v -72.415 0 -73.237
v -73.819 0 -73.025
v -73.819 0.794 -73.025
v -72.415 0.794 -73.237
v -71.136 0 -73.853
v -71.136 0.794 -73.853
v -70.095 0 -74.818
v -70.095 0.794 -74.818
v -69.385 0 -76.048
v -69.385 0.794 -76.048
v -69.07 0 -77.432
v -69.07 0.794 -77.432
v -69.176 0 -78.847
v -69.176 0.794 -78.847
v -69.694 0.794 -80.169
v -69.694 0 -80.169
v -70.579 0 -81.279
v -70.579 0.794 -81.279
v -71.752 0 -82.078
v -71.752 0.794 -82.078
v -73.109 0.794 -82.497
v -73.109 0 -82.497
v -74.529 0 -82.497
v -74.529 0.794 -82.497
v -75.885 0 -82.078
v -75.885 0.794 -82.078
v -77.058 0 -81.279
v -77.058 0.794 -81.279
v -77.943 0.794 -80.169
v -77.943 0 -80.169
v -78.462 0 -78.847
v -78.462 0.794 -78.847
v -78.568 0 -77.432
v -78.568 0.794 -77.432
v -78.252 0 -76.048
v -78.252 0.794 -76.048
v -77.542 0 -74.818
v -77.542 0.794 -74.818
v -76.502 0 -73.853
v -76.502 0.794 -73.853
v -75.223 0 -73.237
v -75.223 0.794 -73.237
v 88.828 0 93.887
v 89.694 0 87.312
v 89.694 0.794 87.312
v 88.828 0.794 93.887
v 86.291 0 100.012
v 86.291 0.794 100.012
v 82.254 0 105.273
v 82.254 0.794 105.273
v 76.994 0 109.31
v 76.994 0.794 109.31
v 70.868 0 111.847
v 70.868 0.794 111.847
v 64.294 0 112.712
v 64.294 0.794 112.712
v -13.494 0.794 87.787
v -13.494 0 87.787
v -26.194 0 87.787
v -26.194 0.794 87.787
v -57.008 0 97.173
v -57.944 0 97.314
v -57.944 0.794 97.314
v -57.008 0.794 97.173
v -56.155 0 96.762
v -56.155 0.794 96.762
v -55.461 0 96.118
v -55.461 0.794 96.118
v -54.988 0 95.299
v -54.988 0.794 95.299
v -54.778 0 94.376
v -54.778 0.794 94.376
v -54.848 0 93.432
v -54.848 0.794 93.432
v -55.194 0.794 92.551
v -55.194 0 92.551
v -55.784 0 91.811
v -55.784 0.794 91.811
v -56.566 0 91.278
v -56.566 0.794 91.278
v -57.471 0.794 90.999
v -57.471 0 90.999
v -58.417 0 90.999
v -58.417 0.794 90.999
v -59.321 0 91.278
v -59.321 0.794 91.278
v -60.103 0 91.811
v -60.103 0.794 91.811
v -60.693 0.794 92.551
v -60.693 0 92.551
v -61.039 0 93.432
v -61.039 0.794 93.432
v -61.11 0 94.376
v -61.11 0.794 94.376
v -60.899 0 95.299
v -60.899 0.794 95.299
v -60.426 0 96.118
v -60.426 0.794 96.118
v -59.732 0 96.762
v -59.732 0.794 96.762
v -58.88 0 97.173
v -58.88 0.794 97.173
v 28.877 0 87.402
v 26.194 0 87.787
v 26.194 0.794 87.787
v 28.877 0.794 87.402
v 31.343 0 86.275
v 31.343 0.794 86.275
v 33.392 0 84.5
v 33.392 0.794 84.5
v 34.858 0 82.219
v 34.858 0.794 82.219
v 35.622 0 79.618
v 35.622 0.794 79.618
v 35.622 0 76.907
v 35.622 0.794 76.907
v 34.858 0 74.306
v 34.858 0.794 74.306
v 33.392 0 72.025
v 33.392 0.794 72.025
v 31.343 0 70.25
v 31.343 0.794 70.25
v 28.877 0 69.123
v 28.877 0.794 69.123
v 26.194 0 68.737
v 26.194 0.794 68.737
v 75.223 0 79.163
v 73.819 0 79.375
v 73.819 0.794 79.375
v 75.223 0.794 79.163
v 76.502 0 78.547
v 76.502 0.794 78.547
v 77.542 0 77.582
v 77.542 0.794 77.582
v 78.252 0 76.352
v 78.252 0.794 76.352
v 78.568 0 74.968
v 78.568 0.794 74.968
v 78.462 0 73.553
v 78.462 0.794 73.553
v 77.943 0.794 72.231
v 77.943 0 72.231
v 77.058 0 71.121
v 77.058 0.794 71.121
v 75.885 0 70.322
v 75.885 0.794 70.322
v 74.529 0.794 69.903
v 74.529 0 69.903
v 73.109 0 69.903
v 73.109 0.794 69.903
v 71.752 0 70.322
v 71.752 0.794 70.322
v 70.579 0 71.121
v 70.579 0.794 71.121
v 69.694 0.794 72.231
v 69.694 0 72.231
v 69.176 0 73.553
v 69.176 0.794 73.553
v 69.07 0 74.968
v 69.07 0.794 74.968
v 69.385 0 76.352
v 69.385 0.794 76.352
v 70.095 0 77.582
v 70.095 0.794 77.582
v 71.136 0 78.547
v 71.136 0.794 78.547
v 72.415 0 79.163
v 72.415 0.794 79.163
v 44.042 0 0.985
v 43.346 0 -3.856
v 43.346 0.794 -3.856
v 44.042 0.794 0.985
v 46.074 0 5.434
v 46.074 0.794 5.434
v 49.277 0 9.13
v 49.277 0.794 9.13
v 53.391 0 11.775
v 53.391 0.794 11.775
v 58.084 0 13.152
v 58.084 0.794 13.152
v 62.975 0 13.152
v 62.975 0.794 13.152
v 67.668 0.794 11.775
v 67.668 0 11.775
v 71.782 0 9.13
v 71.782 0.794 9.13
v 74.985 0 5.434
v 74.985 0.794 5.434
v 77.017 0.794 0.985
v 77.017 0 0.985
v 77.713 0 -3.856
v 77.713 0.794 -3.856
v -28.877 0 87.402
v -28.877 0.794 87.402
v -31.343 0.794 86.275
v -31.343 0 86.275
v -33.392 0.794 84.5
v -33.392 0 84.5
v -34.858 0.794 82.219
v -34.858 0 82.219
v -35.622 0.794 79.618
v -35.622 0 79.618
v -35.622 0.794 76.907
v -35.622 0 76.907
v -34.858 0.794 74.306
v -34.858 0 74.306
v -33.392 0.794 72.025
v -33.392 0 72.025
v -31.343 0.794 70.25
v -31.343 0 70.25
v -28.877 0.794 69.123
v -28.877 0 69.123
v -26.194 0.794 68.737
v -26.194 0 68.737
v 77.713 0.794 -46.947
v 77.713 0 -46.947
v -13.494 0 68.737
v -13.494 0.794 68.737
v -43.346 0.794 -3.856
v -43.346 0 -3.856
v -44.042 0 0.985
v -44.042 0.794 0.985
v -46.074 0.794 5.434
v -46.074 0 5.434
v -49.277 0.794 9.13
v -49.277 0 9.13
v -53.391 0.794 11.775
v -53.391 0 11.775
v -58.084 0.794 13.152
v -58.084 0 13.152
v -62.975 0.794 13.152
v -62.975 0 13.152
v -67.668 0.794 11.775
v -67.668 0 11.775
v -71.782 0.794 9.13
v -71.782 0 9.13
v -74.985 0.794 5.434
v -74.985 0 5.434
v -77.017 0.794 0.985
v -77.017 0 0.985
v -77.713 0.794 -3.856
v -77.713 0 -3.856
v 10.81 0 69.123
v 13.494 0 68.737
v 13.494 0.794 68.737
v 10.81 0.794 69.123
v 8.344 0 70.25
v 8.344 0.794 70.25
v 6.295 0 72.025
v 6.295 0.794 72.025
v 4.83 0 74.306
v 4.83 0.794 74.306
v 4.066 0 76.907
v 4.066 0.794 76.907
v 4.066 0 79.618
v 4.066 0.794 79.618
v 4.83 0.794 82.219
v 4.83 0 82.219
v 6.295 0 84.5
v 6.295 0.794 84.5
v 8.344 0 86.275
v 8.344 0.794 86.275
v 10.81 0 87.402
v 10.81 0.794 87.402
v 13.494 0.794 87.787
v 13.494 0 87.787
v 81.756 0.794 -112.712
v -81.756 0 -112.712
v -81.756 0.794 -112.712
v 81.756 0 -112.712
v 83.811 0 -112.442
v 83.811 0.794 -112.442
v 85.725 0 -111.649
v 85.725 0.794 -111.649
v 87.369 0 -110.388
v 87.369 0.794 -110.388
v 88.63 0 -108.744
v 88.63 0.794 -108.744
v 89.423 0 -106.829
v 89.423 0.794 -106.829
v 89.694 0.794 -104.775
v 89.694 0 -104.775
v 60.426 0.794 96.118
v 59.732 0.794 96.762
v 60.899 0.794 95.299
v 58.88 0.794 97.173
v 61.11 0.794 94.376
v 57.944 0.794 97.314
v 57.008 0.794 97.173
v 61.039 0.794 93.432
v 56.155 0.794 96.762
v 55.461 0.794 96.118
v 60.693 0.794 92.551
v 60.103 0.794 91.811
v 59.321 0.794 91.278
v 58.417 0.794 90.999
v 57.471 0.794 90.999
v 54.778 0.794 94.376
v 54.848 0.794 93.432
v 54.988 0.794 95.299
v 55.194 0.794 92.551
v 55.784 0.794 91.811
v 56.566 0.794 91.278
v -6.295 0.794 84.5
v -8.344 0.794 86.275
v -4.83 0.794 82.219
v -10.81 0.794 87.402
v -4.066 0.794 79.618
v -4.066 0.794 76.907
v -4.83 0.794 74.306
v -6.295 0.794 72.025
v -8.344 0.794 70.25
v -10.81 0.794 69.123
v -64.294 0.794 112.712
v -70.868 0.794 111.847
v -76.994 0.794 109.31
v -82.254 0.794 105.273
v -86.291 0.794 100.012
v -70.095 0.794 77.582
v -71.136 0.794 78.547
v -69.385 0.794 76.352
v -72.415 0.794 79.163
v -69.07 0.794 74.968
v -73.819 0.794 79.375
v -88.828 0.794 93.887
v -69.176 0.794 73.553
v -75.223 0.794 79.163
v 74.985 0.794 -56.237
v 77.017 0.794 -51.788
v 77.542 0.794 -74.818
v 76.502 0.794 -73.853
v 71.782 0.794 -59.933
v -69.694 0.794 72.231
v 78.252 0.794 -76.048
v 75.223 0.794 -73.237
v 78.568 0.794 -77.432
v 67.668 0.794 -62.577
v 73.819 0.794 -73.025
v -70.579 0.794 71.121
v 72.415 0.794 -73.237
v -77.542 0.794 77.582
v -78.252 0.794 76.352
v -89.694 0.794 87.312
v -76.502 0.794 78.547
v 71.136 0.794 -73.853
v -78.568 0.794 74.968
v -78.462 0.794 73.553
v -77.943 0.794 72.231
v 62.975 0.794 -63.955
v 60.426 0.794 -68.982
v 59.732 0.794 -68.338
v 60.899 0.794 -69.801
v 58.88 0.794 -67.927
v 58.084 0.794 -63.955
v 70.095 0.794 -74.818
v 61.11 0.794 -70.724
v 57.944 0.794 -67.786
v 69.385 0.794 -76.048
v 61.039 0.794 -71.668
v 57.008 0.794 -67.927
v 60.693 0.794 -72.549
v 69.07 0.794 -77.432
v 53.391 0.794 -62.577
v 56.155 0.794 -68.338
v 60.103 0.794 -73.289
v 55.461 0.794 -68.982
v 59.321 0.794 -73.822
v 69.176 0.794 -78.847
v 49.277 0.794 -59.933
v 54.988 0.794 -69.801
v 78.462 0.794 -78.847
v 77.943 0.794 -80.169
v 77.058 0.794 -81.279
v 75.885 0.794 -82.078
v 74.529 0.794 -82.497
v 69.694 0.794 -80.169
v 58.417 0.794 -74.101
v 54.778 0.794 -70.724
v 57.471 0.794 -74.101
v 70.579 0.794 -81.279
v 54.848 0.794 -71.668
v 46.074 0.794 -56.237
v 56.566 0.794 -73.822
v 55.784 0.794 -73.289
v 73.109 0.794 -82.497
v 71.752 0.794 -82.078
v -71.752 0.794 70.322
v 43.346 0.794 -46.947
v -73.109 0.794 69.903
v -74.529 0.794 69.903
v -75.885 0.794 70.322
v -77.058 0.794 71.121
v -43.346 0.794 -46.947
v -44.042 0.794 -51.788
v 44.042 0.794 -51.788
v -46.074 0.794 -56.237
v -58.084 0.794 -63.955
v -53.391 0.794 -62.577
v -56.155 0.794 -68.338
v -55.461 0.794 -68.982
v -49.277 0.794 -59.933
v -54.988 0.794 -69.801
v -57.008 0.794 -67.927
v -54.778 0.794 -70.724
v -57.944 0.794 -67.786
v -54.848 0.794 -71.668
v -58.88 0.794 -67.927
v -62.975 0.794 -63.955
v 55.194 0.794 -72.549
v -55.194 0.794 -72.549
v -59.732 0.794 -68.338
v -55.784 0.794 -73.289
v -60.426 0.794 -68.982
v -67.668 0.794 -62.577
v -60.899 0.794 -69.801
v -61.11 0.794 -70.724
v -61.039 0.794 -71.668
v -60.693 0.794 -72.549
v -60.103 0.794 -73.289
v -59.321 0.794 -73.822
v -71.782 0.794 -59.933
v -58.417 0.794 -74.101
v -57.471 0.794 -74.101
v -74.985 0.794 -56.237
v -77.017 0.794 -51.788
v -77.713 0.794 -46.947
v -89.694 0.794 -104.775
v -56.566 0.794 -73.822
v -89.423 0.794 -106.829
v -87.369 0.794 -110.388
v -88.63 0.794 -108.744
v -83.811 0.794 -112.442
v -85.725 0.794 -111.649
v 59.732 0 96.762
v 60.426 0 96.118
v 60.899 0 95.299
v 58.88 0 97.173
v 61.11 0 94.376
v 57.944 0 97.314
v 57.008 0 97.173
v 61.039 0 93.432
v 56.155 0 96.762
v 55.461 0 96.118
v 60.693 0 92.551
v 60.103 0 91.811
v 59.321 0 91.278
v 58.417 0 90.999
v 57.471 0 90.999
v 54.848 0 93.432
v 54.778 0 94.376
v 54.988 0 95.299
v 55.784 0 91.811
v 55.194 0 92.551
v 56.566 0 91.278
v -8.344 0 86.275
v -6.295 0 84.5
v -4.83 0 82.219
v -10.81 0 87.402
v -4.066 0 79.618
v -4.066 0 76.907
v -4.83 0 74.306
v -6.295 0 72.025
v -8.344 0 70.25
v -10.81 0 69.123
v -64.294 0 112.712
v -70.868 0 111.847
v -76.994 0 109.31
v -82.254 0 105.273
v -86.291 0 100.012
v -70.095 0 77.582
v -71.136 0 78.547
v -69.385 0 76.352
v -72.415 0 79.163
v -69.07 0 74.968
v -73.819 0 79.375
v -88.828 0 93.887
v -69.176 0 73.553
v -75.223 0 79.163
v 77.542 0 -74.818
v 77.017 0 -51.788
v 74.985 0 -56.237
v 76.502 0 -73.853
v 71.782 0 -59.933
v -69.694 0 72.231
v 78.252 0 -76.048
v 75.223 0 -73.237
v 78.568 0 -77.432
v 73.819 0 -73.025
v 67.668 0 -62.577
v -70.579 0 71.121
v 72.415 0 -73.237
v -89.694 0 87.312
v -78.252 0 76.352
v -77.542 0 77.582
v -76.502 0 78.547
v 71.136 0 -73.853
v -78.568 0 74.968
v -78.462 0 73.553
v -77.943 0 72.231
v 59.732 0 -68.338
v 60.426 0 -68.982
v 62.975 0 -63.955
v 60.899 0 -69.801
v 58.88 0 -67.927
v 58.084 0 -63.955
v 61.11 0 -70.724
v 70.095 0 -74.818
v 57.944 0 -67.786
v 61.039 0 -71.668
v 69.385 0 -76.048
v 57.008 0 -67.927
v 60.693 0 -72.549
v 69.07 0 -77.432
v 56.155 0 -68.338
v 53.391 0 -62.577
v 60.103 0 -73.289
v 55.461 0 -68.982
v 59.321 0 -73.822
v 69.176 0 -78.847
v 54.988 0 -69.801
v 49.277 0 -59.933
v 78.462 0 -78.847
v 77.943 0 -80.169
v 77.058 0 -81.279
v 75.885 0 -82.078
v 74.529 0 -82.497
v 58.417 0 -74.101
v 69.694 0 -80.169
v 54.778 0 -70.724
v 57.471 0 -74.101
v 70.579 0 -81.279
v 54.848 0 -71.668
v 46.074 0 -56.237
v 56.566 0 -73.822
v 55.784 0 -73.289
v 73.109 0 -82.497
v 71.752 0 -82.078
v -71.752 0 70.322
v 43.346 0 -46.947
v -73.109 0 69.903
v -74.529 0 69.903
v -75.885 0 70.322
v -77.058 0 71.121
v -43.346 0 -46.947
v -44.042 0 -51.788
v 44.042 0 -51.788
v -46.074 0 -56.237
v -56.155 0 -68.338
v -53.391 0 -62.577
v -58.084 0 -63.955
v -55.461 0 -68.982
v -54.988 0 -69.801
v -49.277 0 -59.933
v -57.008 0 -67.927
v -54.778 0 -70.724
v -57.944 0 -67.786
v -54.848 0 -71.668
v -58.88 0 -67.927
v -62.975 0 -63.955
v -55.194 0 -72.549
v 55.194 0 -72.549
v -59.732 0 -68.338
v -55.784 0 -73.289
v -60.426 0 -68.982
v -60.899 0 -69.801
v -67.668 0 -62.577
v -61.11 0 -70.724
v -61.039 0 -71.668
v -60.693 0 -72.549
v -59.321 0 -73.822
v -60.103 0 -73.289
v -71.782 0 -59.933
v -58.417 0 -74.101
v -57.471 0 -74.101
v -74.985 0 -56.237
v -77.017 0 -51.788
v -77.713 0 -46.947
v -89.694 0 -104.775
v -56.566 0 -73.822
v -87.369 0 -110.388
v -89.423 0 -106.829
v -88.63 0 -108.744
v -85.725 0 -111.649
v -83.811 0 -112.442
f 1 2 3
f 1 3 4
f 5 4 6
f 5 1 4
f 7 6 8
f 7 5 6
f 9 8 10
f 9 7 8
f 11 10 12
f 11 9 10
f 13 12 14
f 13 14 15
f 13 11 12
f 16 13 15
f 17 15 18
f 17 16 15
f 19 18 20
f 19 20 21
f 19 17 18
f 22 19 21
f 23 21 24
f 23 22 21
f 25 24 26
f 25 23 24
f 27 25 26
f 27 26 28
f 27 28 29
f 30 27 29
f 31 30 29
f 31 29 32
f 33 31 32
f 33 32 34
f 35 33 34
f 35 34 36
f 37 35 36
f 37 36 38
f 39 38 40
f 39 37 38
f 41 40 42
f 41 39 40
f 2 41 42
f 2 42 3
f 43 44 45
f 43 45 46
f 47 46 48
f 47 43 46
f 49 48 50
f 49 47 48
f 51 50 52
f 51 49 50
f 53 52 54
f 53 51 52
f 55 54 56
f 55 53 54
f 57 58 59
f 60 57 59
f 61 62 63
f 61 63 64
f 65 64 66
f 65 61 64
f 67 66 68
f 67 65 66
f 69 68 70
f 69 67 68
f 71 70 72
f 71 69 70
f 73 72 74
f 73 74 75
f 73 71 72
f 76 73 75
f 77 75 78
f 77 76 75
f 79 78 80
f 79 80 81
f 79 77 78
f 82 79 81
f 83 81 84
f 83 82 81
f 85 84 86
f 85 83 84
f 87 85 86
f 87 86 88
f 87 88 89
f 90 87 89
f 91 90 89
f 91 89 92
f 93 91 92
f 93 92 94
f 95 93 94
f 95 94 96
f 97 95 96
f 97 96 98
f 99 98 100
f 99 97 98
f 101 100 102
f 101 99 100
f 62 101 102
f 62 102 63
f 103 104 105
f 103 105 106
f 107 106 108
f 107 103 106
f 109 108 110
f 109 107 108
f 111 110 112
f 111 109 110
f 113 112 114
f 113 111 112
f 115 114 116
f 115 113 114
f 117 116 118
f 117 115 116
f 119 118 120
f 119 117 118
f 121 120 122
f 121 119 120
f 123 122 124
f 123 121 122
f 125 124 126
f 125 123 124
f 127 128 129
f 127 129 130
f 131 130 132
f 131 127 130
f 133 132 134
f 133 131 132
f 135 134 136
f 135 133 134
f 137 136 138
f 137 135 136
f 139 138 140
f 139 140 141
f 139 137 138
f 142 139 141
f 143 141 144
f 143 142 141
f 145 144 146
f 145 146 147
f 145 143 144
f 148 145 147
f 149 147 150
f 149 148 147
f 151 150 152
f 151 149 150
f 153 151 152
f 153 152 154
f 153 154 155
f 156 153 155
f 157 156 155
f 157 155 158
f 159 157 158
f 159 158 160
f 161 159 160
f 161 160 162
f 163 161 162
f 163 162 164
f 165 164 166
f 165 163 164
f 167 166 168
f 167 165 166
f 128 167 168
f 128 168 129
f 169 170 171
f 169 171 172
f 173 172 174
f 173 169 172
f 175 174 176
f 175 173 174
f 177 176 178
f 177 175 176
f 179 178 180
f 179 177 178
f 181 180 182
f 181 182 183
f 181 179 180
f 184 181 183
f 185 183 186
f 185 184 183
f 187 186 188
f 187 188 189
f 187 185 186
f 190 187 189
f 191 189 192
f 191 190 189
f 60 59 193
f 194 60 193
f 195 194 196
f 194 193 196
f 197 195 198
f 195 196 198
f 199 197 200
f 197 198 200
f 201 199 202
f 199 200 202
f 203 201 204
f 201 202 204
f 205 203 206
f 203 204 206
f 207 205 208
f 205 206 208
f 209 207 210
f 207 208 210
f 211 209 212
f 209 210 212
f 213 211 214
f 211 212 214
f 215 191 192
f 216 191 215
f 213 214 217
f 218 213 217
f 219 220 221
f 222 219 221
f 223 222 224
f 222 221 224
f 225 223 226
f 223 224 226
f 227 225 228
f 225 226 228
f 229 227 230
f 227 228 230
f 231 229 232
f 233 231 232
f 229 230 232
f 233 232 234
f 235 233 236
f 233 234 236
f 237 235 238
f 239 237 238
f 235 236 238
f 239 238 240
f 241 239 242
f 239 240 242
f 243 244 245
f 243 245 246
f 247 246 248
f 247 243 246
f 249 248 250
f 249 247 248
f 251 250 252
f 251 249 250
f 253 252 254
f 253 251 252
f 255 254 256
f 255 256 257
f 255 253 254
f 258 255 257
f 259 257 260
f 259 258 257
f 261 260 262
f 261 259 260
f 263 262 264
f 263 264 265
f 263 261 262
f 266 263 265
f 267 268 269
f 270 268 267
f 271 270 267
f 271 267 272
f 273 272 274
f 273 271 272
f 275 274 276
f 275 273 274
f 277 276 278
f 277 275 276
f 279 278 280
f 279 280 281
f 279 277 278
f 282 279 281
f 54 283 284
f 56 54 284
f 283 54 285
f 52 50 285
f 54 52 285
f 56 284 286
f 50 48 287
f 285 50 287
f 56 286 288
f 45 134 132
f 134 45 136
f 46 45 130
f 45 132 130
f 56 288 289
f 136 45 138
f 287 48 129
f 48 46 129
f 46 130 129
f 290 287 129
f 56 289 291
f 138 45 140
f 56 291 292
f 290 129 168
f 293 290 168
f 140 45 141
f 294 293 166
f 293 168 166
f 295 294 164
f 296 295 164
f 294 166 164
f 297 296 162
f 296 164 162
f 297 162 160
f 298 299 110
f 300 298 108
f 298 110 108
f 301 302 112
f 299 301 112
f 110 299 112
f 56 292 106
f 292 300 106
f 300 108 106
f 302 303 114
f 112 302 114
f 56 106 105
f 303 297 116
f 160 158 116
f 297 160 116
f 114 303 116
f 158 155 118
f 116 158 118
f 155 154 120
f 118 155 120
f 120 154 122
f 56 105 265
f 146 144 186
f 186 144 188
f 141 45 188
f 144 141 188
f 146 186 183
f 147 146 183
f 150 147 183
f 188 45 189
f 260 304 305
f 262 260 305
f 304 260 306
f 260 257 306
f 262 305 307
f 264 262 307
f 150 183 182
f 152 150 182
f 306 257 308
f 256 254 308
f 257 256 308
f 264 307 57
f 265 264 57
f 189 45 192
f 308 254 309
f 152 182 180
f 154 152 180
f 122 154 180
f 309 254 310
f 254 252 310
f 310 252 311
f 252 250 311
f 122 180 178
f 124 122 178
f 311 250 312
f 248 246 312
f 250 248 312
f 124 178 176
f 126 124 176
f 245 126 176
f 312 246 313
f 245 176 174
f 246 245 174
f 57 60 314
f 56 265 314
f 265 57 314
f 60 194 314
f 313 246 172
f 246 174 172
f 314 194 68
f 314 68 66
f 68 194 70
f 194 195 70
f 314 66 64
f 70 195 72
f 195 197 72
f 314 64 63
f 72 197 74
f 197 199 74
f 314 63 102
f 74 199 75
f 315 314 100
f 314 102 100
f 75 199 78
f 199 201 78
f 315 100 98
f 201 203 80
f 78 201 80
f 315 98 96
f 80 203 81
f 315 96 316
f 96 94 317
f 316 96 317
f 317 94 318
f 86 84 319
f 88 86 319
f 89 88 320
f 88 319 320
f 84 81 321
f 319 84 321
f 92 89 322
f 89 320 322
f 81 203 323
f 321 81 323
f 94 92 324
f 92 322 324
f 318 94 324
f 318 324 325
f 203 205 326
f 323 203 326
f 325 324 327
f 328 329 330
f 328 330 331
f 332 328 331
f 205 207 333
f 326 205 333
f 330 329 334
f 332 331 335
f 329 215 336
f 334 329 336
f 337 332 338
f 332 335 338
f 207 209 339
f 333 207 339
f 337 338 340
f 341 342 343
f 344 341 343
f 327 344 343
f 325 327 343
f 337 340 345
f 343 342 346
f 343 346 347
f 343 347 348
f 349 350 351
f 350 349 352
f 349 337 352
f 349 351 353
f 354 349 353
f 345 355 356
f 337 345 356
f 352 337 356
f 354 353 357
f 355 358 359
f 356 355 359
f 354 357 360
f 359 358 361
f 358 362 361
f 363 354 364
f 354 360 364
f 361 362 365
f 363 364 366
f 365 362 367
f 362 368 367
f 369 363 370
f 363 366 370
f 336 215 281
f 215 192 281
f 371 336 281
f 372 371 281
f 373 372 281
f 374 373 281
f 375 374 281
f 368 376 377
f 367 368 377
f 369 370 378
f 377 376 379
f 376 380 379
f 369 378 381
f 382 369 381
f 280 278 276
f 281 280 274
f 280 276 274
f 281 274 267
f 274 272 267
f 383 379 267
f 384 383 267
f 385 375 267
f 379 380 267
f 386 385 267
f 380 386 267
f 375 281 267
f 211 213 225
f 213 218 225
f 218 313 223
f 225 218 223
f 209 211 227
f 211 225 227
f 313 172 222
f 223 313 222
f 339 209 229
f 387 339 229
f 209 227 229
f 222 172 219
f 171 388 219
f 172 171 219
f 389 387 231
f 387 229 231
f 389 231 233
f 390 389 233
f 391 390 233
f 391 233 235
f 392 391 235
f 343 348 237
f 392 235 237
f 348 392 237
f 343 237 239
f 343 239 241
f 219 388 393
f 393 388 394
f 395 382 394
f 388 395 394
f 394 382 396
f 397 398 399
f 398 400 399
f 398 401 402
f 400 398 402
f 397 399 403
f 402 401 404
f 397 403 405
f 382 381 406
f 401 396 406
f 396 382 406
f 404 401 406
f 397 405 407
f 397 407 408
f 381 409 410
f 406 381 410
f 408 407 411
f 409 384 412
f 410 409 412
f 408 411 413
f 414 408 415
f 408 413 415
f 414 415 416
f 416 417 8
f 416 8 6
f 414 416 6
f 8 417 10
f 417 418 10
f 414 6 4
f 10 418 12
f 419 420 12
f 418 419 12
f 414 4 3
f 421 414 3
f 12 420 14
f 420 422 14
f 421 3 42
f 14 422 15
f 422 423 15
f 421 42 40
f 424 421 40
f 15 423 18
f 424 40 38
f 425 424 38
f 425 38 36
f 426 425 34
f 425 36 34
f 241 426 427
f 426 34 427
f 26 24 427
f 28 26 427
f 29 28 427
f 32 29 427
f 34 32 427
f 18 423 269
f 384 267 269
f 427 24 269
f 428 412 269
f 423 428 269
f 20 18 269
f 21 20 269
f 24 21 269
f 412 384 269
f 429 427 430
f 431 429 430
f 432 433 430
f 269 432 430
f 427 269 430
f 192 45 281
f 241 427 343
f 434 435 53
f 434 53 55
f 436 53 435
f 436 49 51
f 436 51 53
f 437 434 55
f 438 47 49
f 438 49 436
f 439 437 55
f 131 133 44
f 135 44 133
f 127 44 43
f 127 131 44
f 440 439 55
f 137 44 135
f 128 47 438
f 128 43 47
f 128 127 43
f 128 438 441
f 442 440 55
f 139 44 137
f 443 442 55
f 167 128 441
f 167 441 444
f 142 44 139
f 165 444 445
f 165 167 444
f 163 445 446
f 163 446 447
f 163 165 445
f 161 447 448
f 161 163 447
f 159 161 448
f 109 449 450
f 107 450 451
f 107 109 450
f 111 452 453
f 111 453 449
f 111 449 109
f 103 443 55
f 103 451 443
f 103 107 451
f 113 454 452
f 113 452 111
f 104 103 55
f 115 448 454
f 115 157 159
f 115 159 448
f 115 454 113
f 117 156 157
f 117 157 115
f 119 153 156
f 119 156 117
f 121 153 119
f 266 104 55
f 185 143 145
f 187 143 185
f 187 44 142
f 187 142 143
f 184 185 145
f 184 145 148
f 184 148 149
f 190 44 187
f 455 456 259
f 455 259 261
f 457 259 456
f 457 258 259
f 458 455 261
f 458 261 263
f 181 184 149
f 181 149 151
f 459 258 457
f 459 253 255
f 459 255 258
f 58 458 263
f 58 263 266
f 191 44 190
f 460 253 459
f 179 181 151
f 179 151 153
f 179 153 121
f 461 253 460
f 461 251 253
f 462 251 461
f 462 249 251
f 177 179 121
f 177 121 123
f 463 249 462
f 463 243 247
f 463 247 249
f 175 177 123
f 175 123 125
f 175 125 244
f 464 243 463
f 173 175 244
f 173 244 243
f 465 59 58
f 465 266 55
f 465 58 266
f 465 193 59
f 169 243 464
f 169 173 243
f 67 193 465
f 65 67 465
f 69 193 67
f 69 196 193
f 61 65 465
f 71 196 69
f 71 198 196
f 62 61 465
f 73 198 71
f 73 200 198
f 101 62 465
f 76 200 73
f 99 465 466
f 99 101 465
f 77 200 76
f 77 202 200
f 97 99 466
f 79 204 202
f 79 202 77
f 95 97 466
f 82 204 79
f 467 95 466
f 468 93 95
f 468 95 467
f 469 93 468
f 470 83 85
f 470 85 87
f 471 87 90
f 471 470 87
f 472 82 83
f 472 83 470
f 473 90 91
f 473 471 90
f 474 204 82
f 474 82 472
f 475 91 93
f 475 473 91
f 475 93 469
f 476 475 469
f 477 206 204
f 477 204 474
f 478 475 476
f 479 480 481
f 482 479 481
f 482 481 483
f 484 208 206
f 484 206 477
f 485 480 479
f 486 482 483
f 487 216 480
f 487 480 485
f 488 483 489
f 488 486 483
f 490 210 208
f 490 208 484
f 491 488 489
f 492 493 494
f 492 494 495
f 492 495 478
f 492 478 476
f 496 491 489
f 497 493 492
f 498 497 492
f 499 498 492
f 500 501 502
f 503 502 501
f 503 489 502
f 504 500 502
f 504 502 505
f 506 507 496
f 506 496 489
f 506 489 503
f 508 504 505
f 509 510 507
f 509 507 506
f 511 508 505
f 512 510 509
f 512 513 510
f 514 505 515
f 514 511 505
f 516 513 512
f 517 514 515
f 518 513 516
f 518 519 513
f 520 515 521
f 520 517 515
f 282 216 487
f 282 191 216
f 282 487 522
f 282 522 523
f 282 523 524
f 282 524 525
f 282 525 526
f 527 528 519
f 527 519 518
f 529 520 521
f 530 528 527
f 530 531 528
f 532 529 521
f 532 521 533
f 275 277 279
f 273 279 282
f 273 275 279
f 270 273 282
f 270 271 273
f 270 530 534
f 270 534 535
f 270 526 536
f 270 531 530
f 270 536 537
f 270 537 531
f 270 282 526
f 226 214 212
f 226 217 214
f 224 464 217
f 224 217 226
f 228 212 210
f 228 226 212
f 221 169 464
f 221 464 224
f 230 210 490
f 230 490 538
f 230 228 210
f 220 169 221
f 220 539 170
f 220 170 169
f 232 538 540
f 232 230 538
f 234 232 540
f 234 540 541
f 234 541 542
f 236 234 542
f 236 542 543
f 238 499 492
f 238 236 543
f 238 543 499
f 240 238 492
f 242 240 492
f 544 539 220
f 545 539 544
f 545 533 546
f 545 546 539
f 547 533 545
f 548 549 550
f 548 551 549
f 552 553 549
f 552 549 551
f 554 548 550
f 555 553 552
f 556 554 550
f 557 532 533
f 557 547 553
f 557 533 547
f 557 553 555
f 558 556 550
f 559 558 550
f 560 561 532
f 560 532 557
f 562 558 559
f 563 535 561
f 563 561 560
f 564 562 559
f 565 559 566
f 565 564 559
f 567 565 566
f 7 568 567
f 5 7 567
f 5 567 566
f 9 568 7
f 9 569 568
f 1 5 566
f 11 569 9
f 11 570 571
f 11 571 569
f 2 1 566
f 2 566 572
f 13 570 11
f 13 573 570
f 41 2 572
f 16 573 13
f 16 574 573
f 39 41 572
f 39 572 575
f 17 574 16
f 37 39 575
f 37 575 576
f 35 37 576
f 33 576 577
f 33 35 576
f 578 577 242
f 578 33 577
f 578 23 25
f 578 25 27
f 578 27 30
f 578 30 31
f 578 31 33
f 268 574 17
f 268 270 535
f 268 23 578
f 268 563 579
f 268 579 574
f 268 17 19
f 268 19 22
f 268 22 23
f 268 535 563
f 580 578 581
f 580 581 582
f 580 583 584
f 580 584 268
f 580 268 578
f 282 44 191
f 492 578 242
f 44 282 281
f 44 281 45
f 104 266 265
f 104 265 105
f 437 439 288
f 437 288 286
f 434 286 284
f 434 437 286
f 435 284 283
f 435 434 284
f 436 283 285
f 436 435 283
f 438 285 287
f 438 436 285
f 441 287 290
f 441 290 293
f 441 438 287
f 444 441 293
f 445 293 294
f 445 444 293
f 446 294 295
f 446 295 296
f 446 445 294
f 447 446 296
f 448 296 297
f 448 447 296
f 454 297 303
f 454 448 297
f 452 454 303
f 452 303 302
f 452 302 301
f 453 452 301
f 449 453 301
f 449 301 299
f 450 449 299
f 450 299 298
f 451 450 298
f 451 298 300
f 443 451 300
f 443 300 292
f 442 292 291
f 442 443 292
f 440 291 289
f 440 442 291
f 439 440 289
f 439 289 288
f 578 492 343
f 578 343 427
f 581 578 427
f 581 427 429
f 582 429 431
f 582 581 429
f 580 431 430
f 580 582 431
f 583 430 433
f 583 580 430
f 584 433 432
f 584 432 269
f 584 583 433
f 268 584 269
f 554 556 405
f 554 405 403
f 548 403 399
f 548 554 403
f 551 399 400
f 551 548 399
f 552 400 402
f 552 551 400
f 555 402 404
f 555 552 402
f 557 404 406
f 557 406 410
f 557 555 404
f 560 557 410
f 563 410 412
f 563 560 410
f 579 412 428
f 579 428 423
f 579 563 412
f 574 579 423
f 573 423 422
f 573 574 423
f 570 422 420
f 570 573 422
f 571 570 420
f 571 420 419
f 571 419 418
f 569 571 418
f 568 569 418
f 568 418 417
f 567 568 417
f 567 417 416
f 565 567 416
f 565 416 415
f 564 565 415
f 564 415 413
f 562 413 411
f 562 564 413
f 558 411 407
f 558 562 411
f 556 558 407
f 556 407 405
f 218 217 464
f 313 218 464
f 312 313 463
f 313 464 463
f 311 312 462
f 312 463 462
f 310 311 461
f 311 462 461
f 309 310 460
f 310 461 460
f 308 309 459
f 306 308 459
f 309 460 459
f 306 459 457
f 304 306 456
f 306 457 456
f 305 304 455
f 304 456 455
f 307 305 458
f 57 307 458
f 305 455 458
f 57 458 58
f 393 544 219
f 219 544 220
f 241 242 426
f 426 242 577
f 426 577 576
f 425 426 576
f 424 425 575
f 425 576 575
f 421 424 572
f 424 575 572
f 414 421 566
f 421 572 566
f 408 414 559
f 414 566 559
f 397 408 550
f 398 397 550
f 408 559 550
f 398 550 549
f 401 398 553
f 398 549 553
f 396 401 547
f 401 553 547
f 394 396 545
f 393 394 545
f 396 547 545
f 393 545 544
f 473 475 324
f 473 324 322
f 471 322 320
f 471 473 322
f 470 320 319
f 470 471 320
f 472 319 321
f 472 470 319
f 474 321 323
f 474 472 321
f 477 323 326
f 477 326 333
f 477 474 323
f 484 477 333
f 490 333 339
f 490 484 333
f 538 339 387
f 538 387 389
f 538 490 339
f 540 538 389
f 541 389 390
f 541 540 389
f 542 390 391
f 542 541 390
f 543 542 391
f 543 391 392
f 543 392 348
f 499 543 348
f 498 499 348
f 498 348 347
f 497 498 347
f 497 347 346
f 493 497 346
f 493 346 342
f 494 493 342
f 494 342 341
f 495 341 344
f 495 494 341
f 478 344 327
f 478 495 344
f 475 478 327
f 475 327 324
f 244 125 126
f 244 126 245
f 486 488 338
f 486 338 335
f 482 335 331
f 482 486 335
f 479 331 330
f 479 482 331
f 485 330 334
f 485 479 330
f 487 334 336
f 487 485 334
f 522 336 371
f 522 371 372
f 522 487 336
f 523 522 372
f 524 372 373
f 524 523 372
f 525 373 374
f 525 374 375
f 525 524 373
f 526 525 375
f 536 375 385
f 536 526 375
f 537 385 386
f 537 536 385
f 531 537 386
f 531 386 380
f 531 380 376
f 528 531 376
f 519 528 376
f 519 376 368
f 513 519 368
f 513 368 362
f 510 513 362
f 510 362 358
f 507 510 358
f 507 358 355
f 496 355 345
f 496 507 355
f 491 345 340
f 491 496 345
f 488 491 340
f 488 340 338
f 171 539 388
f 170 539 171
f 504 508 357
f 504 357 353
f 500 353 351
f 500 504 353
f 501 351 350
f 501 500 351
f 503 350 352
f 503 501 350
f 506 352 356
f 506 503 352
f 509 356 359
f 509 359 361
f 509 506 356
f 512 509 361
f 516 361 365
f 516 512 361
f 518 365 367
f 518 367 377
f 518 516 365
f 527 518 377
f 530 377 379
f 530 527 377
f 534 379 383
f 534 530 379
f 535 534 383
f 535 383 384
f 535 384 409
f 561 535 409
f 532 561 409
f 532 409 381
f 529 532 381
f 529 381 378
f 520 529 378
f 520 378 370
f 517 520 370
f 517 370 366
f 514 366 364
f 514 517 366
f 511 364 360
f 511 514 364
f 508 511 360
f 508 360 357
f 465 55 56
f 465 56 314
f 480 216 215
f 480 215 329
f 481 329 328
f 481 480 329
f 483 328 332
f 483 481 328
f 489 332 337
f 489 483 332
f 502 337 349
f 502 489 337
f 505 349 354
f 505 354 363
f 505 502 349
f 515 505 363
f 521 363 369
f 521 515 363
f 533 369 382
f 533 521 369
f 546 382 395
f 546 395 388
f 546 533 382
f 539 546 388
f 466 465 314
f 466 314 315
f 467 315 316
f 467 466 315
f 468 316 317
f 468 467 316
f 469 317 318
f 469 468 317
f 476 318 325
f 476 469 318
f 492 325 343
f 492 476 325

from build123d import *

# Parameters (mm, degrees)
SKETCH1_R           = 3.175
SKETCH1_R_2         = 4.7625
BOSS_EXTRUDE1_DEPTH = 0.79375


with BuildPart() as part:
    # Sketch1 → Boss-Extrude1 (new body)
    with BuildSketch(Plane(origin=(0, 0, 0), x_dir=(1, 0, 0), z_dir=(0, 1, 0))):
        with BuildLine():
            Line((-81.75625, 112.7125), (81.75625, 112.7125))
            ThreePointArc((81.75625, 112.7125), (87.368910076, 110.387660076), (89.69375, 104.775))
            Line((89.69375, 104.775), (89.69375, -87.3125))
            ThreePointArc((89.69375, -87.3125), (82.254262242, -105.273012242), (64.29375, -112.7125))
            Line((64.29375, -112.7125), (-64.29375, -112.7125))
            ThreePointArc((-64.29375, -112.7125), (-82.254262242, -105.273012242), (-89.69375, -87.3125))
            Line((-89.69375, -87.3125), (-89.69375, 104.775))
            ThreePointArc((-89.69375, 104.775), (-87.368910076, 110.387660076), (-81.75625, 112.7125))
        make_face()
        with Locations(Location((-57.94375, 70.96125, 0), (0, 0, 270))):
            Circle(SKETCH1_R, mode=Mode.SUBTRACT)
        with Locations(Location((57.94375, 70.96125, 0), (0, 0, 270))):
            Circle(SKETCH1_R, mode=Mode.SUBTRACT)
        with Locations(Location((57.94375, -94.13875, 0), (0, 0, 270))):
            Circle(SKETCH1_R, mode=Mode.SUBTRACT)
        with Locations(Location((-57.94375, -94.13875, 0), (0, 0, 270))):
            Circle(SKETCH1_R, mode=Mode.SUBTRACT)
        with Locations(Location((-73.81875, -74.6125, 0), (0, 0, 270))):
            Circle(SKETCH1_R_2, mode=Mode.SUBTRACT)
        with Locations(Location((-73.81875, 77.7875, 0), (0, 0, 270))):
            Circle(SKETCH1_R_2, mode=Mode.SUBTRACT)
        with Locations(Location((73.81875, 77.7875, 0), (0, 0, 270))):
            Circle(SKETCH1_R_2, mode=Mode.SUBTRACT)
        with Locations(Location((73.81875, -74.6125, 0), (0, 0, 270))):
            Circle(SKETCH1_R_2, mode=Mode.SUBTRACT)
        with BuildLine():
            Line((-26.19375, -68.73748), (-13.49375, -68.73748))
            ThreePointArc((-13.49375, -68.73748), (-3.96875, -78.26248), (-13.49375, -87.78748))
            Line((-13.49375, -87.78748), (-26.19375, -87.78748))
            ThreePointArc((-26.19375, -87.78748), (-35.71875, -78.26248), (-26.19375, -68.73748))
        make_face(mode=Mode.SUBTRACT)
        with BuildLine():
            Line((26.19375, -68.73748), (13.49375, -68.73748))
            ThreePointArc((13.49375, -68.73748), (3.96875, -78.26248), (13.49375, -87.78748))
            Line((13.49375, -87.78748), (26.19375, -87.78748))
            ThreePointArc((26.19375, -87.78748), (35.71875, -78.26248), (26.19375, -68.73748))
        make_face(mode=Mode.SUBTRACT)
        with BuildLine():
            Line((-43.34637, 46.94682), (-43.34637, 3.85572))
            ThreePointArc((-43.34637, 3.85572), (-60.52947, -13.32738), (-77.71257, 3.85572))
            Line((-77.71257, 3.85572), (-77.71257, 46.94682))
            ThreePointArc((-77.71257, 46.94682), (-60.52947, 64.12992), (-43.34637, 46.94682))
        make_face(mode=Mode.SUBTRACT)
        with BuildLine():
            Line((43.34637, 46.94682), (43.34637, 3.85572))
            ThreePointArc((43.34637, 3.85572), (60.52947, -13.32738), (77.71257, 3.85572))
            Line((77.71257, 3.85572), (77.71257, 46.94682))
            ThreePointArc((77.71257, 46.94682), (60.52947, 64.12992), (43.34637, 46.94682))
        make_face(mode=Mode.SUBTRACT)
    extrude(amount=BOSS_EXTRUDE1_DEPTH)


solid = part.part
